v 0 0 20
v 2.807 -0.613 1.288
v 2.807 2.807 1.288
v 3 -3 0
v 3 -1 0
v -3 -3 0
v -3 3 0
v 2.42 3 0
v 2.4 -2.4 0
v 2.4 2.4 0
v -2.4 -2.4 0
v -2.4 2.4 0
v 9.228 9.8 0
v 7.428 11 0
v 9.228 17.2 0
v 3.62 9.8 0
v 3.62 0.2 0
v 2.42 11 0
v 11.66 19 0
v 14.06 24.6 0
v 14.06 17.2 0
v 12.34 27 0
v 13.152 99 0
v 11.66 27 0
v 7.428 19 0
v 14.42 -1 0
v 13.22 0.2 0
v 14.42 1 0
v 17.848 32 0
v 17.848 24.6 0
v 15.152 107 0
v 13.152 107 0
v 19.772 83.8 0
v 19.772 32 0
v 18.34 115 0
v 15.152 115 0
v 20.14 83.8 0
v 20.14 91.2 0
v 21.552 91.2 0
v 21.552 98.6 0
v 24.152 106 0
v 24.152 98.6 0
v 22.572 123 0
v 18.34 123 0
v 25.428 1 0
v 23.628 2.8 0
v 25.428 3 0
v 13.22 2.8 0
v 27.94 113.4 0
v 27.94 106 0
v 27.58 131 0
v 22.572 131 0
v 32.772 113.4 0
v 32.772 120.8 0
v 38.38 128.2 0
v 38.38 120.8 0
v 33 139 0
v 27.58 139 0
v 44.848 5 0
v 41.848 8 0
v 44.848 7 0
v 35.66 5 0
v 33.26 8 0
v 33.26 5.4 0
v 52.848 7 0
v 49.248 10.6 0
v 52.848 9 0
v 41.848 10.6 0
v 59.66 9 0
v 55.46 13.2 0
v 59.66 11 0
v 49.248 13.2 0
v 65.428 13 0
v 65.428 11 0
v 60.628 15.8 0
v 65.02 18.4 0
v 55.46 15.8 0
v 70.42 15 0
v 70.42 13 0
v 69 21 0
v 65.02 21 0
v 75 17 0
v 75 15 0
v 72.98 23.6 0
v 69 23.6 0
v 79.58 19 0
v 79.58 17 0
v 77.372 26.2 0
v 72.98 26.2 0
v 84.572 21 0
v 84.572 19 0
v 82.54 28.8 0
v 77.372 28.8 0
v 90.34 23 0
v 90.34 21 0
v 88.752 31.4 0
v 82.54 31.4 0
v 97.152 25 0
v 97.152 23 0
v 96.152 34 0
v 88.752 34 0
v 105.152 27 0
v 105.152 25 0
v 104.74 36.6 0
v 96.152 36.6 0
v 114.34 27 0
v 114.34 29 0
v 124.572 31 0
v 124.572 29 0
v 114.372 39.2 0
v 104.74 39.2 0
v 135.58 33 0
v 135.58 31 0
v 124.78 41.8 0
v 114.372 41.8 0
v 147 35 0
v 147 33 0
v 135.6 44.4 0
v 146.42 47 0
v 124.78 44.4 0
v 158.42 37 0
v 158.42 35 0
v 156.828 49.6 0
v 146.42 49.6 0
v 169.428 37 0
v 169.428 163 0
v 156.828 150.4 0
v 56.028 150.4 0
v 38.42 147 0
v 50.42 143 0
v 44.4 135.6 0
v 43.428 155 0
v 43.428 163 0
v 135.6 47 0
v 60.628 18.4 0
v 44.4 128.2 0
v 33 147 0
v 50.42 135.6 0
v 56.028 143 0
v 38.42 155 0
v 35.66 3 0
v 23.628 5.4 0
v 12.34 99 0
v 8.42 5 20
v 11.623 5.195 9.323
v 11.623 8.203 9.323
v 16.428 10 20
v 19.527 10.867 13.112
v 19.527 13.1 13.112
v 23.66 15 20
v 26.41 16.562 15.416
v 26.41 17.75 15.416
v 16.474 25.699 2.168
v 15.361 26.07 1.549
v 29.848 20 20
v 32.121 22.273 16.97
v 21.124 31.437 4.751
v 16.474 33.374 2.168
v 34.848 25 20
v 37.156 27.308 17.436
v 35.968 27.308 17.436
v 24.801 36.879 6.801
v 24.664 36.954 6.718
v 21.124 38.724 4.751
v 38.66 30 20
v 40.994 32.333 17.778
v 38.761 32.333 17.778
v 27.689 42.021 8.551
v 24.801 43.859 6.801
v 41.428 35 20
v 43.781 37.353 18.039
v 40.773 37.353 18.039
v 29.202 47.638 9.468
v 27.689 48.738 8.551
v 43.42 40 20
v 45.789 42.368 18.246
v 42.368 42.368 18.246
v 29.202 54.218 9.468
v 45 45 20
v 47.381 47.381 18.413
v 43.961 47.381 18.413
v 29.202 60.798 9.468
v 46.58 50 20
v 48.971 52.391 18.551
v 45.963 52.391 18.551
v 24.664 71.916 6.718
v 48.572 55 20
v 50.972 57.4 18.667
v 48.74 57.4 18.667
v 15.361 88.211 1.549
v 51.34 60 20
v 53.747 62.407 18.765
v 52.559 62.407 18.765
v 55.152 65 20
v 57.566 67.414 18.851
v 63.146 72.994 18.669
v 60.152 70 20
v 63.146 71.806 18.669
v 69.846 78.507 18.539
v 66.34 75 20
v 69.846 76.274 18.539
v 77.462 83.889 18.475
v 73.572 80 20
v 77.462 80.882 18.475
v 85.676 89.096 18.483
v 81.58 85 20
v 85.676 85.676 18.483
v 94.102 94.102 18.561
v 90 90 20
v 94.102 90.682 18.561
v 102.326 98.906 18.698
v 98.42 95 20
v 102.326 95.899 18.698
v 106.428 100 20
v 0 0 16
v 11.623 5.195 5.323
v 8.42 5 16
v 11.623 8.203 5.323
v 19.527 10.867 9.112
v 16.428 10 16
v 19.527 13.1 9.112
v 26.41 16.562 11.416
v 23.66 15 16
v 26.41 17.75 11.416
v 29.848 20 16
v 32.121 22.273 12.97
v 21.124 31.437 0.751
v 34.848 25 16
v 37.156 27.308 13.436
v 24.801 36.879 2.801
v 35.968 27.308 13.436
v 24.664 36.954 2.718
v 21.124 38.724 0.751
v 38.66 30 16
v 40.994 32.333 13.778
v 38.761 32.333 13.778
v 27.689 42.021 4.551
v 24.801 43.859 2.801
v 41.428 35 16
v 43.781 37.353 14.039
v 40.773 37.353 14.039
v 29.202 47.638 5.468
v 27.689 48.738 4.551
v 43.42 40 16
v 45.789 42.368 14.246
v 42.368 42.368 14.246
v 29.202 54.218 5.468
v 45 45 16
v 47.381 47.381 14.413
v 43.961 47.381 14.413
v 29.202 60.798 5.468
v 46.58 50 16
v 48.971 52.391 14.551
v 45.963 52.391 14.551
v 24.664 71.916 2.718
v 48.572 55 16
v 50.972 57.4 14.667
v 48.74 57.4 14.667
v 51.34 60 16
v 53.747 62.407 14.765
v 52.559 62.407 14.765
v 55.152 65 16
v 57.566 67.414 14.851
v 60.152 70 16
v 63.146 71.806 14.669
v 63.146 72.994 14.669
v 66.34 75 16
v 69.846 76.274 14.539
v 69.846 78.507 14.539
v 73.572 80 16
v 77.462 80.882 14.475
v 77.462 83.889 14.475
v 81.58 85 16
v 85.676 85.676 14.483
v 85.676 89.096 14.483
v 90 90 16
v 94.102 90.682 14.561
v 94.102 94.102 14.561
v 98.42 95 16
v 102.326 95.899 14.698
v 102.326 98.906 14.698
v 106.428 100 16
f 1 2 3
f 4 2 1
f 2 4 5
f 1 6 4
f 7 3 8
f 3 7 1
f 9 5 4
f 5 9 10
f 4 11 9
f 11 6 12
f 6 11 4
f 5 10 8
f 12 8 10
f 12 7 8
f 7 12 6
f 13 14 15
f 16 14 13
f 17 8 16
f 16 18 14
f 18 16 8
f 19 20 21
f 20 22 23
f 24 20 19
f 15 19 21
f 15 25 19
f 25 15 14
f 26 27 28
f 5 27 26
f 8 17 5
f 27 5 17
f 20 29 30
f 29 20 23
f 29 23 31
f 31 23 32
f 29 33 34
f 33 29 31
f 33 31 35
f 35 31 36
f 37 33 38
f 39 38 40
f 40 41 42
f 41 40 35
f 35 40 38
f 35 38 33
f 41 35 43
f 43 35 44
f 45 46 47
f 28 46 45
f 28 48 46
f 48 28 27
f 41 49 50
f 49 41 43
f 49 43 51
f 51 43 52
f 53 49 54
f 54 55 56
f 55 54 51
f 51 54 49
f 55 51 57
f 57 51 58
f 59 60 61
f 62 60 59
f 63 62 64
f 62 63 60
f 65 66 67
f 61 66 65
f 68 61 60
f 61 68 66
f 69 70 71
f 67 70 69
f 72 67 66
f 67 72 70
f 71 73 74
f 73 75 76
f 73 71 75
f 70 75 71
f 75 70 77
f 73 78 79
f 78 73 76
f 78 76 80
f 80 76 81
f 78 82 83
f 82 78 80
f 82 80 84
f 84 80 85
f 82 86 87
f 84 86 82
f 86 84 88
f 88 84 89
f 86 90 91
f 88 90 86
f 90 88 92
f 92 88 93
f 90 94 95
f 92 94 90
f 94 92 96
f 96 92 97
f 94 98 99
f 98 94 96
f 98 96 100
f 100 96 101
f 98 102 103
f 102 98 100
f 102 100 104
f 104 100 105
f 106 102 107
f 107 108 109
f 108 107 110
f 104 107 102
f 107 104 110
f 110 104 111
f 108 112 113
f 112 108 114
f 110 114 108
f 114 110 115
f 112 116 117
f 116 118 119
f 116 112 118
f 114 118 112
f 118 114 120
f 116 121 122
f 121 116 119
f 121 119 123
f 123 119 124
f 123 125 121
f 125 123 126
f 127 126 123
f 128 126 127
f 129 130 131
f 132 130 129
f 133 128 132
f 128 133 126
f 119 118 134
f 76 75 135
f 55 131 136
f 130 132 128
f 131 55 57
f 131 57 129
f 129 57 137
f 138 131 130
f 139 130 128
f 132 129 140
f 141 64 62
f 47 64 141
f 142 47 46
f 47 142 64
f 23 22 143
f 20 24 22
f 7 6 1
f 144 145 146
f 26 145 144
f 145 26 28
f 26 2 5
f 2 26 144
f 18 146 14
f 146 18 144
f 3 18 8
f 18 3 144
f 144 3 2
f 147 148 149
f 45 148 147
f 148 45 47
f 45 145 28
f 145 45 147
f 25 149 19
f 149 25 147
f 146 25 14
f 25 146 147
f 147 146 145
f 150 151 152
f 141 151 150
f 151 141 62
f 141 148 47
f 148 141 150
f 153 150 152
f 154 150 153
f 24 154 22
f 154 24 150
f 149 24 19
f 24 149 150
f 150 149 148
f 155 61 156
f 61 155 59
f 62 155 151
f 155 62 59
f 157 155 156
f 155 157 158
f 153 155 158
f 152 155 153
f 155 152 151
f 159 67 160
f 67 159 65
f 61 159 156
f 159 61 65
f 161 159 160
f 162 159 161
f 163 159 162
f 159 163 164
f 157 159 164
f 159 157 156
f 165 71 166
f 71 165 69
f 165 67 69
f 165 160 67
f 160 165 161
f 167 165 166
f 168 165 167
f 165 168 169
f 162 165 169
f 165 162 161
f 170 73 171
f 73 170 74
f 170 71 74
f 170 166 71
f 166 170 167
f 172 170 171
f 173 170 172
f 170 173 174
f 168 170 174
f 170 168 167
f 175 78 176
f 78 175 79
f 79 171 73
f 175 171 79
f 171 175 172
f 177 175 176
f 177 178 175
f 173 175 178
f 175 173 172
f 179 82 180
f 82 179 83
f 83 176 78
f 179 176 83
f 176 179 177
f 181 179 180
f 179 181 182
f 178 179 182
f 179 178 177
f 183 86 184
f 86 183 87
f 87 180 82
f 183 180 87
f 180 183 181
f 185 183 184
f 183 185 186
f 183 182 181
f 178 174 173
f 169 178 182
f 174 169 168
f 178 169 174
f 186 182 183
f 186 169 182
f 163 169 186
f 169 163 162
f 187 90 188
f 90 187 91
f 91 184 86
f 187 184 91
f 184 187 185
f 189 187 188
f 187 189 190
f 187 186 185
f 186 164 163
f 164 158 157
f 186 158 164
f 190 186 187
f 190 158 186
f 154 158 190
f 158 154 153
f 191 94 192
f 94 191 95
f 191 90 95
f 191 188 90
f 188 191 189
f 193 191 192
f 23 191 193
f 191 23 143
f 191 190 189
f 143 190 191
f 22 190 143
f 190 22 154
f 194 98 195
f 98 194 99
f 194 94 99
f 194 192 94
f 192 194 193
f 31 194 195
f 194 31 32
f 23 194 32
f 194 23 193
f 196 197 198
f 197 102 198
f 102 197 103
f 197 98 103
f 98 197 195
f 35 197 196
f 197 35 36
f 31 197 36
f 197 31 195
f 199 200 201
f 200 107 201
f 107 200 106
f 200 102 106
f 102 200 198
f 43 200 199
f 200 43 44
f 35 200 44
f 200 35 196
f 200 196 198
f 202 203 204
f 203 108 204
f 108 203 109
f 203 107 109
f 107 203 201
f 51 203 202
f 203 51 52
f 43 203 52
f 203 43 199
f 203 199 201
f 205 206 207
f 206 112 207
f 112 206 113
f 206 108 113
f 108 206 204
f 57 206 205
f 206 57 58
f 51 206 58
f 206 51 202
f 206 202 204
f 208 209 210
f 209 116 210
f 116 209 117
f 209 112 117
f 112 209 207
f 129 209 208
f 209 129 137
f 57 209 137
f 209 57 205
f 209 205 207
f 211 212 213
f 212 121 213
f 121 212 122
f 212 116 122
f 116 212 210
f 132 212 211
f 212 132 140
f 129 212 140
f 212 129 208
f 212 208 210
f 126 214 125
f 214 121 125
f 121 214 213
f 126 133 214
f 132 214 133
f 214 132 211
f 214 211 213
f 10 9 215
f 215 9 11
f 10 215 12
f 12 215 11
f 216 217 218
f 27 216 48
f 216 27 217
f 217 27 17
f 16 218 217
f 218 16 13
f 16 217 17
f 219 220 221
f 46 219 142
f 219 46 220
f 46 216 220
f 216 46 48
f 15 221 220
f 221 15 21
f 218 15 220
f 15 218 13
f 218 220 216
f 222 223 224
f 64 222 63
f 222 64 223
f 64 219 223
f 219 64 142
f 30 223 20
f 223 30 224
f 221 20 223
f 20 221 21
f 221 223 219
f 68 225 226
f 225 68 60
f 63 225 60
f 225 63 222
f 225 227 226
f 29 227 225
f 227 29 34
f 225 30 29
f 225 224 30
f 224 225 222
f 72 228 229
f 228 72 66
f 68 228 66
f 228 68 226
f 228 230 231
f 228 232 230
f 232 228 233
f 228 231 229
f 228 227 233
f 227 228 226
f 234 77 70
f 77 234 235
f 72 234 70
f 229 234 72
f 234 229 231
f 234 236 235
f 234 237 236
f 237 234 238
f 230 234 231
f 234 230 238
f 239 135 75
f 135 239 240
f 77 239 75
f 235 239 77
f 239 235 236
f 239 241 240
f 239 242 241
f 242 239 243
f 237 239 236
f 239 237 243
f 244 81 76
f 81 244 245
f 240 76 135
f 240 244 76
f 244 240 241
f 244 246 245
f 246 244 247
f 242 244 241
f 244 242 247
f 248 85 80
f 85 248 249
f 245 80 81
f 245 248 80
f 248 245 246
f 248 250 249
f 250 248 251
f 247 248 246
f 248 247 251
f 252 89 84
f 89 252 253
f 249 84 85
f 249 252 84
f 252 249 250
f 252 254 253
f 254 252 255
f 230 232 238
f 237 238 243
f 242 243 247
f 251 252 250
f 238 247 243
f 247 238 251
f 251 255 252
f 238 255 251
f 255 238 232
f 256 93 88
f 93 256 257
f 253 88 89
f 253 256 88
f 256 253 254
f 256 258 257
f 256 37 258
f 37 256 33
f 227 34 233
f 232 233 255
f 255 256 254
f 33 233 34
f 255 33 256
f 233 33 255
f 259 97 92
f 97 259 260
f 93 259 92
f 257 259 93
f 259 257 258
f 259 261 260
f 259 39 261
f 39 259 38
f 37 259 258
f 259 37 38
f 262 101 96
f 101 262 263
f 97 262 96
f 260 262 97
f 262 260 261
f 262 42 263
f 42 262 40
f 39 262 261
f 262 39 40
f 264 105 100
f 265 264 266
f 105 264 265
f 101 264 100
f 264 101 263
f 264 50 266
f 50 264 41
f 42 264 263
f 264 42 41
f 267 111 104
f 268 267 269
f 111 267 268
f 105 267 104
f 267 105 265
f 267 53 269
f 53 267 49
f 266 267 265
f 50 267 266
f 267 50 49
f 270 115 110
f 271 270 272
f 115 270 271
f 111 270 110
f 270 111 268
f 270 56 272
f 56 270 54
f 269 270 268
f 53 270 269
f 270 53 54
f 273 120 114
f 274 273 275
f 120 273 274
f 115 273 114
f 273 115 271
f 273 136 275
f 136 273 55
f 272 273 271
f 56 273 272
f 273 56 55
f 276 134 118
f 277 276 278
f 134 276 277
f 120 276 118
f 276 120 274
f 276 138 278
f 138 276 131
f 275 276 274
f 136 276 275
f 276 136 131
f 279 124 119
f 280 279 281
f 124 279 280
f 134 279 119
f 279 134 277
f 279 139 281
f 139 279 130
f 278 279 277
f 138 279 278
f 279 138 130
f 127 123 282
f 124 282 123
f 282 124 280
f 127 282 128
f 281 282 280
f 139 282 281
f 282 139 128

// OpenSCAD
module piramide(altura = 10, base = 5) {
polyhedron(
  points=[ [base,base,0],[base,-base,0],[-base,-base,0],[-base,base,0], // the four points at base
           [0,0,altura]  ],                                 // the apex point 
  faces=[ [0,1,4],[1,2,4],[2,3,4],[3,0,4],              // each triangle side
              [1,0,3],[2,1,3] ]                         // two triangles for square base
 );
}

module cascarudo() {
    union() {
        for (gabi=[0:20]) {
            translate([gabi * 5 + sin(gabi*20) * 10, gabi*5 , 0])
            piramide(20, 3+gabi*3);
        }
    }
}

difference() {
     cascarudo();
    
    translate([0,0,-4])
     cascarudo();
}
